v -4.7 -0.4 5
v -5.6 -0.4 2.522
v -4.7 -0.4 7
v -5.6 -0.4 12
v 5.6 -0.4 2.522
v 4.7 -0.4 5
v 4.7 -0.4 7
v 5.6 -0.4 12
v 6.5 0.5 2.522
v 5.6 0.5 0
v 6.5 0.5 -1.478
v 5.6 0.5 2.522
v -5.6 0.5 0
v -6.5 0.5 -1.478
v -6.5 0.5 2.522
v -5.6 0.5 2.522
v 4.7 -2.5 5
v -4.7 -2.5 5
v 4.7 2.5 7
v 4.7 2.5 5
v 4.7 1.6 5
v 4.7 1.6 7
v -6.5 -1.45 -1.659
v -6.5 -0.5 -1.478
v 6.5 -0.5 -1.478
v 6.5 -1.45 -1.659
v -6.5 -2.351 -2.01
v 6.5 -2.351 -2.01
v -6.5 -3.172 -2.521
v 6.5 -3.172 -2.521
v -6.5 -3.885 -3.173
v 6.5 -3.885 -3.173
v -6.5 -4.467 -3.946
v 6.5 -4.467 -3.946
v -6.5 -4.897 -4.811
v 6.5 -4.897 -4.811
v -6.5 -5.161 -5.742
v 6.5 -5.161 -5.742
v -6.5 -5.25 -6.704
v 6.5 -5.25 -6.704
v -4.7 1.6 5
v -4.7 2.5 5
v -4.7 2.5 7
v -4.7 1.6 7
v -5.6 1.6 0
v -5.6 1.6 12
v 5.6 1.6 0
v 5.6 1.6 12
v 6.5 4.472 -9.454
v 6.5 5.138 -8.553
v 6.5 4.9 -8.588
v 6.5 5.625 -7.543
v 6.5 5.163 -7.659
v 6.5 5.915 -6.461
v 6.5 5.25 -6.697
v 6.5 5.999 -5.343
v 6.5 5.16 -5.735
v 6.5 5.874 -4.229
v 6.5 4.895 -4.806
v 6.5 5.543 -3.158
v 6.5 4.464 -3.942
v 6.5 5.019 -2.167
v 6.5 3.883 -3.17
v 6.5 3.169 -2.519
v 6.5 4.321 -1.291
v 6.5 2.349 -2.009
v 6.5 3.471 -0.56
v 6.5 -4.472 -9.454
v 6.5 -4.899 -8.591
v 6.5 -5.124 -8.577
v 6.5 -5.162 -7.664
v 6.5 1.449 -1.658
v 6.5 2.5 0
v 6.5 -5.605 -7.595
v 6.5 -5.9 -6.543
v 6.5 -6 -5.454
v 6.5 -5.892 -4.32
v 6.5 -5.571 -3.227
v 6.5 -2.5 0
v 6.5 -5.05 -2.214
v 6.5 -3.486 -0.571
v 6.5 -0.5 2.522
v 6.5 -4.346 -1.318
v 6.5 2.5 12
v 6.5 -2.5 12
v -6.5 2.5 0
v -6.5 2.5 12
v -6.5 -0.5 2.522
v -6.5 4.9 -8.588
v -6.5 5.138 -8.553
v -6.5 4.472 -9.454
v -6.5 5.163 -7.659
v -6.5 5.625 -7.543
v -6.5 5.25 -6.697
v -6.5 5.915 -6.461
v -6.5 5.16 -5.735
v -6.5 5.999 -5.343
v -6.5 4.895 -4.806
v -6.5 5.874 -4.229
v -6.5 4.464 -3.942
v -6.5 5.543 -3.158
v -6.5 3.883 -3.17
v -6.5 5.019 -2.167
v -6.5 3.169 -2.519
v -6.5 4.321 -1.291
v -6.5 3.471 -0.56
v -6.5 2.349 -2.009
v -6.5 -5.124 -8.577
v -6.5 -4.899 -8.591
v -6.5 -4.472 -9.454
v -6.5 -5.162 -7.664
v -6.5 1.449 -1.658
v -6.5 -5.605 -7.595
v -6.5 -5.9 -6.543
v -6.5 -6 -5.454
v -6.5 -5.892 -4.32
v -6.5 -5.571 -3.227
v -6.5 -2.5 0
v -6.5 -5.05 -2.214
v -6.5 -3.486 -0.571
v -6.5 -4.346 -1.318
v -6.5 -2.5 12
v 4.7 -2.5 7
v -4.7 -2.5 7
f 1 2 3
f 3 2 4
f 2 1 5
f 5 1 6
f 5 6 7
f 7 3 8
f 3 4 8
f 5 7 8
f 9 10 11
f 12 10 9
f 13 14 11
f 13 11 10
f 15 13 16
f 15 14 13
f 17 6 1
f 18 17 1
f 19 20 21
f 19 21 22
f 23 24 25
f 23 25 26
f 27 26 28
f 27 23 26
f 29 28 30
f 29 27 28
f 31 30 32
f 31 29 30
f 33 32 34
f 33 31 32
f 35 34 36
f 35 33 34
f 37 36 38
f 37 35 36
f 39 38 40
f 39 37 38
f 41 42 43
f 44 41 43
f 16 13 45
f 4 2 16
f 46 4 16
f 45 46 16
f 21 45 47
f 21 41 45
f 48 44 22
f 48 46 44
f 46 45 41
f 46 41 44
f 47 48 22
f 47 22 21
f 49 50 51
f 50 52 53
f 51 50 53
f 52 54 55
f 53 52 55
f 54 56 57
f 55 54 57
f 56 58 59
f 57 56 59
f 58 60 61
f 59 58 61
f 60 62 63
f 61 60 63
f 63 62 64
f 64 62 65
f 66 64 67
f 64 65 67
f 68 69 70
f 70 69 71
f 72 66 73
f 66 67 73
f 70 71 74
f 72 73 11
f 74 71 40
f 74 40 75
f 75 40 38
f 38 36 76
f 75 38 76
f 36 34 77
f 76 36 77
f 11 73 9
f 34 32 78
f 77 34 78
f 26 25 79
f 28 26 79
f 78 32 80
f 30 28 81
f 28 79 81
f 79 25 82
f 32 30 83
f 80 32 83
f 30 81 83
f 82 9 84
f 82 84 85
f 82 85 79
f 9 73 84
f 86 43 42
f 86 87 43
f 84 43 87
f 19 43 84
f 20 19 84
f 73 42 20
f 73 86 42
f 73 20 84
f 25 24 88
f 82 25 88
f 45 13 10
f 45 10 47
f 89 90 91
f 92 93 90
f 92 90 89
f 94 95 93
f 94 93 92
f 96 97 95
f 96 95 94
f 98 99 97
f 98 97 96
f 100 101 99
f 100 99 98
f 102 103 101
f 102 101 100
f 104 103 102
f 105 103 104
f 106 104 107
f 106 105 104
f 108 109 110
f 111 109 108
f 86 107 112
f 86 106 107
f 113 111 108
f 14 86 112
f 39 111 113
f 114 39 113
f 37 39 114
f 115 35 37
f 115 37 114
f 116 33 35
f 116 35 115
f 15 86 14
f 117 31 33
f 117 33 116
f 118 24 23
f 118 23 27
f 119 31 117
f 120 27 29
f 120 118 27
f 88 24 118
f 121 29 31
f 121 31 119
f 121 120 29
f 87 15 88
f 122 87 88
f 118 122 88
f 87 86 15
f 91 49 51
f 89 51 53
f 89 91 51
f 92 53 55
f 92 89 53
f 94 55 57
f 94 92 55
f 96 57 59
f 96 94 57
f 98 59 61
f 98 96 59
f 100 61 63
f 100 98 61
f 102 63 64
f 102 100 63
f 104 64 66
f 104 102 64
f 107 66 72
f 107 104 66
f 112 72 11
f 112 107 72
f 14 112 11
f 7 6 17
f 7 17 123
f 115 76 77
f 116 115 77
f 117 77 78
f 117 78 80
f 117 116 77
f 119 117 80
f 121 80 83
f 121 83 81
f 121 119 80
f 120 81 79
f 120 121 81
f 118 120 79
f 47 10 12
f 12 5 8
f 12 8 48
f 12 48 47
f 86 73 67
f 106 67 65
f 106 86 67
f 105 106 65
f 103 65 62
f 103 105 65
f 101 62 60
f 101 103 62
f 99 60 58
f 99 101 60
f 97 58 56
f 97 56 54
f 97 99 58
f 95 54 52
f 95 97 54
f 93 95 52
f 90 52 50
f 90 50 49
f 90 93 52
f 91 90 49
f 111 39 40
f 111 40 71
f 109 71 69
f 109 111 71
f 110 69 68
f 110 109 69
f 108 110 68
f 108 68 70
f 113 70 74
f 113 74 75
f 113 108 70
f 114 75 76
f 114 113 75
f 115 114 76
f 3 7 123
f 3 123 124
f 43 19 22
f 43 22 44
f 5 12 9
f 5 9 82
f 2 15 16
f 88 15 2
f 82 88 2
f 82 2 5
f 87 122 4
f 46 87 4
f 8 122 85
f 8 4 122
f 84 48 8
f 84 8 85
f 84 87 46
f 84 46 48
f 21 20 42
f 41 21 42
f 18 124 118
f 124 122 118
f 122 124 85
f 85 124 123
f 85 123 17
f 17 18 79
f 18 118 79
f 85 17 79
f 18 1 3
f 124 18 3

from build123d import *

# Parameters (mm, degrees)
F0_W     = 13
F0_H     = 5
F1_DEPTH = 12
F2_W     = 11.2
F2_H     = 2
F3_DEPTH = 12
F4_W     = 9.4
F4_H     = 2
F5_DEPTH = 5.001
F7_DEPTH = 13
F8_W     = 1
F8_H     = 4
F9_DEPTH = 13.001


with BuildPart() as f1:
    # F0 (on Top) → F1 (new body)
    with BuildSketch(Plane.XY):
        Rectangle(F0_W, F0_H)
    extrude(amount=F1_DEPTH)

    # F2 (on face) → F3 (cut)
    with BuildSketch(Plane.XY.offset(12)):
        with Locations((0, 0.6)):
            Rectangle(F2_W, F2_H)
    extrude(amount=-F3_DEPTH, mode=Mode.SUBTRACT)

    # F4 (on face) → F5 (cut, through all)
    with BuildSketch(Plane(origin=(0, 2.5, 0), x_dir=(-1, 0, 0), z_dir=(0, 1, 0))):
        with Locations((0, 6)):
            Rectangle(F4_W, F4_H)
    extrude(amount=-F5_DEPTH, mode=Mode.SUBTRACT)

    # F6 (on face) → F7 (join)
    with BuildSketch(Plane(origin=(-6.5, 0, 0), x_dir=(0, -1, 0), z_dir=(-1, 0, 0))):
        with BuildLine():
            ThreePointArc((4.472136, -9.454356), (5.605034, -7.595289), (6, -5.454356))
            ThreePointArc((6, -5.454356), (5.049752, -2.213986), (2.5, 0))
            Line((2.5, 0), (-2.5, 0))
            ThreePointArc((-2.5, 0), (-5.873575, -4.229155), (-4.472136, -9.454356))
            ThreePointArc((-4.472136, -9.454356), (-1.428948, -1.652564), (5.25, -6.704356))
            ThreePointArc((5.25, -6.704356), (5.051792, -8.133304), (4.472136, -9.454356))
        make_face()
    extrude(amount=-F7_DEPTH)

    # F8 (on face) → F9 (cut, through all)
    with BuildSketch(Plane(origin=(-6.5, 0, 0), x_dir=(0, -1, 0), z_dir=(-1, 0, 0))):
        with Locations((0, 0.52178)):
            Rectangle(F8_W, F8_H)
    extrude(amount=-F9_DEPTH, mode=Mode.SUBTRACT)


solid = f1.part
